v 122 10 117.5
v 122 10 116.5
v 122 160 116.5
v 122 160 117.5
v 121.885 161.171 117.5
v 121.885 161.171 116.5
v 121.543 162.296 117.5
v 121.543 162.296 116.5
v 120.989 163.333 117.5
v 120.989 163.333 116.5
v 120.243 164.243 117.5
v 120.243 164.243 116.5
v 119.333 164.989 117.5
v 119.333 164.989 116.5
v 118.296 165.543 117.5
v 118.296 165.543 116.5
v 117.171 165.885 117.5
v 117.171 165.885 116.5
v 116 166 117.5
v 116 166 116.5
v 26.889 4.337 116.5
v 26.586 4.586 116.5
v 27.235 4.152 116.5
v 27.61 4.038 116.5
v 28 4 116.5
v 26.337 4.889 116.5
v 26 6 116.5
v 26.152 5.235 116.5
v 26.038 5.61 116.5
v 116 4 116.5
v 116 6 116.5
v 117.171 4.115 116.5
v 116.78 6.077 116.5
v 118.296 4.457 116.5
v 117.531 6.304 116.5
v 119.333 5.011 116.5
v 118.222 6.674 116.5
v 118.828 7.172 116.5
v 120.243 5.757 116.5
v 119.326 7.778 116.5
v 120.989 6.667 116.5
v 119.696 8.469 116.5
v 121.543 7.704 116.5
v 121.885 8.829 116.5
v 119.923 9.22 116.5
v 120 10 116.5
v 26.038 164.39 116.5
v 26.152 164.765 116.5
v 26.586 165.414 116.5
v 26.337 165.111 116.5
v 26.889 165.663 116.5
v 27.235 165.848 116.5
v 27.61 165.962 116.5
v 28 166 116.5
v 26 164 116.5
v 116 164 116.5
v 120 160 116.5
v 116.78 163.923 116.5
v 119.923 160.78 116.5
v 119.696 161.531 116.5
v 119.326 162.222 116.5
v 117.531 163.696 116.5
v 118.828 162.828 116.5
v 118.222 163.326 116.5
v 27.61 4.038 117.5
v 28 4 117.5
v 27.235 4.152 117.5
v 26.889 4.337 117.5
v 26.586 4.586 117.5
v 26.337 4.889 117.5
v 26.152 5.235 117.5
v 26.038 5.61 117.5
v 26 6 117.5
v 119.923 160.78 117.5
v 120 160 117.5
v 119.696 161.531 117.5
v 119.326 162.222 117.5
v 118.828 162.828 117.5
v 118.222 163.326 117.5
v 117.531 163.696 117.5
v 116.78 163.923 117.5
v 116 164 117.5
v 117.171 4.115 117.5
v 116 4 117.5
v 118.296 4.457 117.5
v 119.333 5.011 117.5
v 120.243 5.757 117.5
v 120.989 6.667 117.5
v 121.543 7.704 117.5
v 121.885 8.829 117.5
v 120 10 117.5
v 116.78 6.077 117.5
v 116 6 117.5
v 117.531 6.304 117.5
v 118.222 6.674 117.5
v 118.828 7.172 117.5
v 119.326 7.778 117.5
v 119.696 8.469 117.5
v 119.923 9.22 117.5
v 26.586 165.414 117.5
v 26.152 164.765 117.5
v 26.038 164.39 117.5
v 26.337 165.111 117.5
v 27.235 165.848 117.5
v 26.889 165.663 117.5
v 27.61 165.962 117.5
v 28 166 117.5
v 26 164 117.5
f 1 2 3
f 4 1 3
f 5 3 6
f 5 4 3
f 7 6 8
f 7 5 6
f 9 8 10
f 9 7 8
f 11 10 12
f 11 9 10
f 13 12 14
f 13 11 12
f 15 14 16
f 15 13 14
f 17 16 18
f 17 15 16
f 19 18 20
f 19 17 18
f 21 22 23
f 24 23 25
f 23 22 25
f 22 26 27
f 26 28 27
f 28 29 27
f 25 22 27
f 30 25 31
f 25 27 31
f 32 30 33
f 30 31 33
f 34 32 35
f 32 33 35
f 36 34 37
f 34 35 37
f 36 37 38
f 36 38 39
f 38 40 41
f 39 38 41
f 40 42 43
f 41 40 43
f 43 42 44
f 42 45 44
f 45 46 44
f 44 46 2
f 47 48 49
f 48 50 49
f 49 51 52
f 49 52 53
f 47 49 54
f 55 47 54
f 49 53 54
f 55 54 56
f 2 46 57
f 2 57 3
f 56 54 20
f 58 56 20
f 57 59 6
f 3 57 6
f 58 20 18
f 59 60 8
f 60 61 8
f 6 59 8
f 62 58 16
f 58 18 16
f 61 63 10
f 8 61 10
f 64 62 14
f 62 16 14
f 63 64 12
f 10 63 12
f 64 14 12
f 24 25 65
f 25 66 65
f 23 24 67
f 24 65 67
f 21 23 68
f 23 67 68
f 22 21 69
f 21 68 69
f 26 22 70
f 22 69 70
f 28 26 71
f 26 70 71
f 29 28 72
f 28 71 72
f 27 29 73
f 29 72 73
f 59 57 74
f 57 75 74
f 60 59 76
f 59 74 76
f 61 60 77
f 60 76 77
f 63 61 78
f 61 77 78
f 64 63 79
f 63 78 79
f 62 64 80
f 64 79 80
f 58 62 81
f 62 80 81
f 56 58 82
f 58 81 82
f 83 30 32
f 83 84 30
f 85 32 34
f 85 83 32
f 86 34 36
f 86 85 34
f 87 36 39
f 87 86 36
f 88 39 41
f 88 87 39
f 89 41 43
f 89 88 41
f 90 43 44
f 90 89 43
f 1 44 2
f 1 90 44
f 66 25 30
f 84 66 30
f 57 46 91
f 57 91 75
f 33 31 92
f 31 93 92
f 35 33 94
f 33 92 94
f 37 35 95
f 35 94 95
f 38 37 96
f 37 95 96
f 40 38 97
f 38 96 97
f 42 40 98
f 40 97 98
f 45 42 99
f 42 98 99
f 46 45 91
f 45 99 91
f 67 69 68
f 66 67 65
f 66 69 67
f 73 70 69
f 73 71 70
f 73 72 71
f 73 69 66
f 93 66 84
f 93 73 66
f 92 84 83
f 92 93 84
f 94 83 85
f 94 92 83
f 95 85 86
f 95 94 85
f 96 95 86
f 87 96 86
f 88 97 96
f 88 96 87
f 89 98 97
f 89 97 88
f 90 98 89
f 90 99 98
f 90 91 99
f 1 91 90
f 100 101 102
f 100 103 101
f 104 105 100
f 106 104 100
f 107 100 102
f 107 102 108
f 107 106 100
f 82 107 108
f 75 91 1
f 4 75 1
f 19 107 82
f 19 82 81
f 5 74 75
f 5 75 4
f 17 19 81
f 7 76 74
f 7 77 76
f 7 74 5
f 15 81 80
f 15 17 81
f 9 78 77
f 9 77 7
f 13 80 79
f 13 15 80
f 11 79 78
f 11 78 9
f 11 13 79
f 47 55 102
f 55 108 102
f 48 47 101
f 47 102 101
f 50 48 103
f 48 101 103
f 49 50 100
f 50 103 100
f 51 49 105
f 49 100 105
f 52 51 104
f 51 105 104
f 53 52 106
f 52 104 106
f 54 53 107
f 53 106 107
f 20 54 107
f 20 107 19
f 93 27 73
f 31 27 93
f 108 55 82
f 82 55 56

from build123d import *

# Parameters (mm, degrees)
BOX017_W     = 94
BOX017_H     = 158
BOX017_DEPTH = 1
FILLET009_R  = 4
BOX016_W     = 96
BOX016_H     = 162
BOX016_DEPTH = 1
FILLET010_R  = 6
FILLET011_R  = 2


with BuildPart() as fillet009:
    # Box017 → Box017 (new body)
    with BuildSketch(Plane(origin=(26, 6, 116.5), x_dir=(1, 0, 0), z_dir=(0, 0, 1))):
        with Locations((47, 79)):
            Rectangle(BOX017_W, BOX017_H)
    extrude(amount=BOX017_DEPTH)

    # Fillet009
    fillet009_edges = [fillet009.edges().sort_by_distance(p)[0] for p in [
        (120, 6, 117),
        (120, 164, 117),
    ]]
    fillet(fillet009_edges, radius=FILLET009_R)


with BuildPart() as cut352:
    # Box016 → Box016 (new body)
    with BuildSketch(Plane(origin=(26, 4, 116.5), x_dir=(1, 0, 0), z_dir=(0, 0, 1))):
        with Locations((48, 81)):
            Rectangle(BOX016_W, BOX016_H)
    extrude(amount=BOX016_DEPTH)

    # Fillet010
    fillet010_edges = [cut352.edges().sort_by_distance(p)[0] for p in [
        (122, 4, 117),
        (122, 166, 117),
    ]]
    fillet(fillet010_edges, radius=FILLET010_R)

    # Fillet011
    fillet011_edges = [cut352.edges().sort_by_distance(p)[0] for p in [
        (26, 166, 117),
        (26, 4, 117),
    ]]
    fillet(fillet011_edges, radius=FILLET011_R)

    # Cut012: cut Fillet009
    add(fillet009.part, mode=Mode.SUBTRACT)


solid = cut352.part
